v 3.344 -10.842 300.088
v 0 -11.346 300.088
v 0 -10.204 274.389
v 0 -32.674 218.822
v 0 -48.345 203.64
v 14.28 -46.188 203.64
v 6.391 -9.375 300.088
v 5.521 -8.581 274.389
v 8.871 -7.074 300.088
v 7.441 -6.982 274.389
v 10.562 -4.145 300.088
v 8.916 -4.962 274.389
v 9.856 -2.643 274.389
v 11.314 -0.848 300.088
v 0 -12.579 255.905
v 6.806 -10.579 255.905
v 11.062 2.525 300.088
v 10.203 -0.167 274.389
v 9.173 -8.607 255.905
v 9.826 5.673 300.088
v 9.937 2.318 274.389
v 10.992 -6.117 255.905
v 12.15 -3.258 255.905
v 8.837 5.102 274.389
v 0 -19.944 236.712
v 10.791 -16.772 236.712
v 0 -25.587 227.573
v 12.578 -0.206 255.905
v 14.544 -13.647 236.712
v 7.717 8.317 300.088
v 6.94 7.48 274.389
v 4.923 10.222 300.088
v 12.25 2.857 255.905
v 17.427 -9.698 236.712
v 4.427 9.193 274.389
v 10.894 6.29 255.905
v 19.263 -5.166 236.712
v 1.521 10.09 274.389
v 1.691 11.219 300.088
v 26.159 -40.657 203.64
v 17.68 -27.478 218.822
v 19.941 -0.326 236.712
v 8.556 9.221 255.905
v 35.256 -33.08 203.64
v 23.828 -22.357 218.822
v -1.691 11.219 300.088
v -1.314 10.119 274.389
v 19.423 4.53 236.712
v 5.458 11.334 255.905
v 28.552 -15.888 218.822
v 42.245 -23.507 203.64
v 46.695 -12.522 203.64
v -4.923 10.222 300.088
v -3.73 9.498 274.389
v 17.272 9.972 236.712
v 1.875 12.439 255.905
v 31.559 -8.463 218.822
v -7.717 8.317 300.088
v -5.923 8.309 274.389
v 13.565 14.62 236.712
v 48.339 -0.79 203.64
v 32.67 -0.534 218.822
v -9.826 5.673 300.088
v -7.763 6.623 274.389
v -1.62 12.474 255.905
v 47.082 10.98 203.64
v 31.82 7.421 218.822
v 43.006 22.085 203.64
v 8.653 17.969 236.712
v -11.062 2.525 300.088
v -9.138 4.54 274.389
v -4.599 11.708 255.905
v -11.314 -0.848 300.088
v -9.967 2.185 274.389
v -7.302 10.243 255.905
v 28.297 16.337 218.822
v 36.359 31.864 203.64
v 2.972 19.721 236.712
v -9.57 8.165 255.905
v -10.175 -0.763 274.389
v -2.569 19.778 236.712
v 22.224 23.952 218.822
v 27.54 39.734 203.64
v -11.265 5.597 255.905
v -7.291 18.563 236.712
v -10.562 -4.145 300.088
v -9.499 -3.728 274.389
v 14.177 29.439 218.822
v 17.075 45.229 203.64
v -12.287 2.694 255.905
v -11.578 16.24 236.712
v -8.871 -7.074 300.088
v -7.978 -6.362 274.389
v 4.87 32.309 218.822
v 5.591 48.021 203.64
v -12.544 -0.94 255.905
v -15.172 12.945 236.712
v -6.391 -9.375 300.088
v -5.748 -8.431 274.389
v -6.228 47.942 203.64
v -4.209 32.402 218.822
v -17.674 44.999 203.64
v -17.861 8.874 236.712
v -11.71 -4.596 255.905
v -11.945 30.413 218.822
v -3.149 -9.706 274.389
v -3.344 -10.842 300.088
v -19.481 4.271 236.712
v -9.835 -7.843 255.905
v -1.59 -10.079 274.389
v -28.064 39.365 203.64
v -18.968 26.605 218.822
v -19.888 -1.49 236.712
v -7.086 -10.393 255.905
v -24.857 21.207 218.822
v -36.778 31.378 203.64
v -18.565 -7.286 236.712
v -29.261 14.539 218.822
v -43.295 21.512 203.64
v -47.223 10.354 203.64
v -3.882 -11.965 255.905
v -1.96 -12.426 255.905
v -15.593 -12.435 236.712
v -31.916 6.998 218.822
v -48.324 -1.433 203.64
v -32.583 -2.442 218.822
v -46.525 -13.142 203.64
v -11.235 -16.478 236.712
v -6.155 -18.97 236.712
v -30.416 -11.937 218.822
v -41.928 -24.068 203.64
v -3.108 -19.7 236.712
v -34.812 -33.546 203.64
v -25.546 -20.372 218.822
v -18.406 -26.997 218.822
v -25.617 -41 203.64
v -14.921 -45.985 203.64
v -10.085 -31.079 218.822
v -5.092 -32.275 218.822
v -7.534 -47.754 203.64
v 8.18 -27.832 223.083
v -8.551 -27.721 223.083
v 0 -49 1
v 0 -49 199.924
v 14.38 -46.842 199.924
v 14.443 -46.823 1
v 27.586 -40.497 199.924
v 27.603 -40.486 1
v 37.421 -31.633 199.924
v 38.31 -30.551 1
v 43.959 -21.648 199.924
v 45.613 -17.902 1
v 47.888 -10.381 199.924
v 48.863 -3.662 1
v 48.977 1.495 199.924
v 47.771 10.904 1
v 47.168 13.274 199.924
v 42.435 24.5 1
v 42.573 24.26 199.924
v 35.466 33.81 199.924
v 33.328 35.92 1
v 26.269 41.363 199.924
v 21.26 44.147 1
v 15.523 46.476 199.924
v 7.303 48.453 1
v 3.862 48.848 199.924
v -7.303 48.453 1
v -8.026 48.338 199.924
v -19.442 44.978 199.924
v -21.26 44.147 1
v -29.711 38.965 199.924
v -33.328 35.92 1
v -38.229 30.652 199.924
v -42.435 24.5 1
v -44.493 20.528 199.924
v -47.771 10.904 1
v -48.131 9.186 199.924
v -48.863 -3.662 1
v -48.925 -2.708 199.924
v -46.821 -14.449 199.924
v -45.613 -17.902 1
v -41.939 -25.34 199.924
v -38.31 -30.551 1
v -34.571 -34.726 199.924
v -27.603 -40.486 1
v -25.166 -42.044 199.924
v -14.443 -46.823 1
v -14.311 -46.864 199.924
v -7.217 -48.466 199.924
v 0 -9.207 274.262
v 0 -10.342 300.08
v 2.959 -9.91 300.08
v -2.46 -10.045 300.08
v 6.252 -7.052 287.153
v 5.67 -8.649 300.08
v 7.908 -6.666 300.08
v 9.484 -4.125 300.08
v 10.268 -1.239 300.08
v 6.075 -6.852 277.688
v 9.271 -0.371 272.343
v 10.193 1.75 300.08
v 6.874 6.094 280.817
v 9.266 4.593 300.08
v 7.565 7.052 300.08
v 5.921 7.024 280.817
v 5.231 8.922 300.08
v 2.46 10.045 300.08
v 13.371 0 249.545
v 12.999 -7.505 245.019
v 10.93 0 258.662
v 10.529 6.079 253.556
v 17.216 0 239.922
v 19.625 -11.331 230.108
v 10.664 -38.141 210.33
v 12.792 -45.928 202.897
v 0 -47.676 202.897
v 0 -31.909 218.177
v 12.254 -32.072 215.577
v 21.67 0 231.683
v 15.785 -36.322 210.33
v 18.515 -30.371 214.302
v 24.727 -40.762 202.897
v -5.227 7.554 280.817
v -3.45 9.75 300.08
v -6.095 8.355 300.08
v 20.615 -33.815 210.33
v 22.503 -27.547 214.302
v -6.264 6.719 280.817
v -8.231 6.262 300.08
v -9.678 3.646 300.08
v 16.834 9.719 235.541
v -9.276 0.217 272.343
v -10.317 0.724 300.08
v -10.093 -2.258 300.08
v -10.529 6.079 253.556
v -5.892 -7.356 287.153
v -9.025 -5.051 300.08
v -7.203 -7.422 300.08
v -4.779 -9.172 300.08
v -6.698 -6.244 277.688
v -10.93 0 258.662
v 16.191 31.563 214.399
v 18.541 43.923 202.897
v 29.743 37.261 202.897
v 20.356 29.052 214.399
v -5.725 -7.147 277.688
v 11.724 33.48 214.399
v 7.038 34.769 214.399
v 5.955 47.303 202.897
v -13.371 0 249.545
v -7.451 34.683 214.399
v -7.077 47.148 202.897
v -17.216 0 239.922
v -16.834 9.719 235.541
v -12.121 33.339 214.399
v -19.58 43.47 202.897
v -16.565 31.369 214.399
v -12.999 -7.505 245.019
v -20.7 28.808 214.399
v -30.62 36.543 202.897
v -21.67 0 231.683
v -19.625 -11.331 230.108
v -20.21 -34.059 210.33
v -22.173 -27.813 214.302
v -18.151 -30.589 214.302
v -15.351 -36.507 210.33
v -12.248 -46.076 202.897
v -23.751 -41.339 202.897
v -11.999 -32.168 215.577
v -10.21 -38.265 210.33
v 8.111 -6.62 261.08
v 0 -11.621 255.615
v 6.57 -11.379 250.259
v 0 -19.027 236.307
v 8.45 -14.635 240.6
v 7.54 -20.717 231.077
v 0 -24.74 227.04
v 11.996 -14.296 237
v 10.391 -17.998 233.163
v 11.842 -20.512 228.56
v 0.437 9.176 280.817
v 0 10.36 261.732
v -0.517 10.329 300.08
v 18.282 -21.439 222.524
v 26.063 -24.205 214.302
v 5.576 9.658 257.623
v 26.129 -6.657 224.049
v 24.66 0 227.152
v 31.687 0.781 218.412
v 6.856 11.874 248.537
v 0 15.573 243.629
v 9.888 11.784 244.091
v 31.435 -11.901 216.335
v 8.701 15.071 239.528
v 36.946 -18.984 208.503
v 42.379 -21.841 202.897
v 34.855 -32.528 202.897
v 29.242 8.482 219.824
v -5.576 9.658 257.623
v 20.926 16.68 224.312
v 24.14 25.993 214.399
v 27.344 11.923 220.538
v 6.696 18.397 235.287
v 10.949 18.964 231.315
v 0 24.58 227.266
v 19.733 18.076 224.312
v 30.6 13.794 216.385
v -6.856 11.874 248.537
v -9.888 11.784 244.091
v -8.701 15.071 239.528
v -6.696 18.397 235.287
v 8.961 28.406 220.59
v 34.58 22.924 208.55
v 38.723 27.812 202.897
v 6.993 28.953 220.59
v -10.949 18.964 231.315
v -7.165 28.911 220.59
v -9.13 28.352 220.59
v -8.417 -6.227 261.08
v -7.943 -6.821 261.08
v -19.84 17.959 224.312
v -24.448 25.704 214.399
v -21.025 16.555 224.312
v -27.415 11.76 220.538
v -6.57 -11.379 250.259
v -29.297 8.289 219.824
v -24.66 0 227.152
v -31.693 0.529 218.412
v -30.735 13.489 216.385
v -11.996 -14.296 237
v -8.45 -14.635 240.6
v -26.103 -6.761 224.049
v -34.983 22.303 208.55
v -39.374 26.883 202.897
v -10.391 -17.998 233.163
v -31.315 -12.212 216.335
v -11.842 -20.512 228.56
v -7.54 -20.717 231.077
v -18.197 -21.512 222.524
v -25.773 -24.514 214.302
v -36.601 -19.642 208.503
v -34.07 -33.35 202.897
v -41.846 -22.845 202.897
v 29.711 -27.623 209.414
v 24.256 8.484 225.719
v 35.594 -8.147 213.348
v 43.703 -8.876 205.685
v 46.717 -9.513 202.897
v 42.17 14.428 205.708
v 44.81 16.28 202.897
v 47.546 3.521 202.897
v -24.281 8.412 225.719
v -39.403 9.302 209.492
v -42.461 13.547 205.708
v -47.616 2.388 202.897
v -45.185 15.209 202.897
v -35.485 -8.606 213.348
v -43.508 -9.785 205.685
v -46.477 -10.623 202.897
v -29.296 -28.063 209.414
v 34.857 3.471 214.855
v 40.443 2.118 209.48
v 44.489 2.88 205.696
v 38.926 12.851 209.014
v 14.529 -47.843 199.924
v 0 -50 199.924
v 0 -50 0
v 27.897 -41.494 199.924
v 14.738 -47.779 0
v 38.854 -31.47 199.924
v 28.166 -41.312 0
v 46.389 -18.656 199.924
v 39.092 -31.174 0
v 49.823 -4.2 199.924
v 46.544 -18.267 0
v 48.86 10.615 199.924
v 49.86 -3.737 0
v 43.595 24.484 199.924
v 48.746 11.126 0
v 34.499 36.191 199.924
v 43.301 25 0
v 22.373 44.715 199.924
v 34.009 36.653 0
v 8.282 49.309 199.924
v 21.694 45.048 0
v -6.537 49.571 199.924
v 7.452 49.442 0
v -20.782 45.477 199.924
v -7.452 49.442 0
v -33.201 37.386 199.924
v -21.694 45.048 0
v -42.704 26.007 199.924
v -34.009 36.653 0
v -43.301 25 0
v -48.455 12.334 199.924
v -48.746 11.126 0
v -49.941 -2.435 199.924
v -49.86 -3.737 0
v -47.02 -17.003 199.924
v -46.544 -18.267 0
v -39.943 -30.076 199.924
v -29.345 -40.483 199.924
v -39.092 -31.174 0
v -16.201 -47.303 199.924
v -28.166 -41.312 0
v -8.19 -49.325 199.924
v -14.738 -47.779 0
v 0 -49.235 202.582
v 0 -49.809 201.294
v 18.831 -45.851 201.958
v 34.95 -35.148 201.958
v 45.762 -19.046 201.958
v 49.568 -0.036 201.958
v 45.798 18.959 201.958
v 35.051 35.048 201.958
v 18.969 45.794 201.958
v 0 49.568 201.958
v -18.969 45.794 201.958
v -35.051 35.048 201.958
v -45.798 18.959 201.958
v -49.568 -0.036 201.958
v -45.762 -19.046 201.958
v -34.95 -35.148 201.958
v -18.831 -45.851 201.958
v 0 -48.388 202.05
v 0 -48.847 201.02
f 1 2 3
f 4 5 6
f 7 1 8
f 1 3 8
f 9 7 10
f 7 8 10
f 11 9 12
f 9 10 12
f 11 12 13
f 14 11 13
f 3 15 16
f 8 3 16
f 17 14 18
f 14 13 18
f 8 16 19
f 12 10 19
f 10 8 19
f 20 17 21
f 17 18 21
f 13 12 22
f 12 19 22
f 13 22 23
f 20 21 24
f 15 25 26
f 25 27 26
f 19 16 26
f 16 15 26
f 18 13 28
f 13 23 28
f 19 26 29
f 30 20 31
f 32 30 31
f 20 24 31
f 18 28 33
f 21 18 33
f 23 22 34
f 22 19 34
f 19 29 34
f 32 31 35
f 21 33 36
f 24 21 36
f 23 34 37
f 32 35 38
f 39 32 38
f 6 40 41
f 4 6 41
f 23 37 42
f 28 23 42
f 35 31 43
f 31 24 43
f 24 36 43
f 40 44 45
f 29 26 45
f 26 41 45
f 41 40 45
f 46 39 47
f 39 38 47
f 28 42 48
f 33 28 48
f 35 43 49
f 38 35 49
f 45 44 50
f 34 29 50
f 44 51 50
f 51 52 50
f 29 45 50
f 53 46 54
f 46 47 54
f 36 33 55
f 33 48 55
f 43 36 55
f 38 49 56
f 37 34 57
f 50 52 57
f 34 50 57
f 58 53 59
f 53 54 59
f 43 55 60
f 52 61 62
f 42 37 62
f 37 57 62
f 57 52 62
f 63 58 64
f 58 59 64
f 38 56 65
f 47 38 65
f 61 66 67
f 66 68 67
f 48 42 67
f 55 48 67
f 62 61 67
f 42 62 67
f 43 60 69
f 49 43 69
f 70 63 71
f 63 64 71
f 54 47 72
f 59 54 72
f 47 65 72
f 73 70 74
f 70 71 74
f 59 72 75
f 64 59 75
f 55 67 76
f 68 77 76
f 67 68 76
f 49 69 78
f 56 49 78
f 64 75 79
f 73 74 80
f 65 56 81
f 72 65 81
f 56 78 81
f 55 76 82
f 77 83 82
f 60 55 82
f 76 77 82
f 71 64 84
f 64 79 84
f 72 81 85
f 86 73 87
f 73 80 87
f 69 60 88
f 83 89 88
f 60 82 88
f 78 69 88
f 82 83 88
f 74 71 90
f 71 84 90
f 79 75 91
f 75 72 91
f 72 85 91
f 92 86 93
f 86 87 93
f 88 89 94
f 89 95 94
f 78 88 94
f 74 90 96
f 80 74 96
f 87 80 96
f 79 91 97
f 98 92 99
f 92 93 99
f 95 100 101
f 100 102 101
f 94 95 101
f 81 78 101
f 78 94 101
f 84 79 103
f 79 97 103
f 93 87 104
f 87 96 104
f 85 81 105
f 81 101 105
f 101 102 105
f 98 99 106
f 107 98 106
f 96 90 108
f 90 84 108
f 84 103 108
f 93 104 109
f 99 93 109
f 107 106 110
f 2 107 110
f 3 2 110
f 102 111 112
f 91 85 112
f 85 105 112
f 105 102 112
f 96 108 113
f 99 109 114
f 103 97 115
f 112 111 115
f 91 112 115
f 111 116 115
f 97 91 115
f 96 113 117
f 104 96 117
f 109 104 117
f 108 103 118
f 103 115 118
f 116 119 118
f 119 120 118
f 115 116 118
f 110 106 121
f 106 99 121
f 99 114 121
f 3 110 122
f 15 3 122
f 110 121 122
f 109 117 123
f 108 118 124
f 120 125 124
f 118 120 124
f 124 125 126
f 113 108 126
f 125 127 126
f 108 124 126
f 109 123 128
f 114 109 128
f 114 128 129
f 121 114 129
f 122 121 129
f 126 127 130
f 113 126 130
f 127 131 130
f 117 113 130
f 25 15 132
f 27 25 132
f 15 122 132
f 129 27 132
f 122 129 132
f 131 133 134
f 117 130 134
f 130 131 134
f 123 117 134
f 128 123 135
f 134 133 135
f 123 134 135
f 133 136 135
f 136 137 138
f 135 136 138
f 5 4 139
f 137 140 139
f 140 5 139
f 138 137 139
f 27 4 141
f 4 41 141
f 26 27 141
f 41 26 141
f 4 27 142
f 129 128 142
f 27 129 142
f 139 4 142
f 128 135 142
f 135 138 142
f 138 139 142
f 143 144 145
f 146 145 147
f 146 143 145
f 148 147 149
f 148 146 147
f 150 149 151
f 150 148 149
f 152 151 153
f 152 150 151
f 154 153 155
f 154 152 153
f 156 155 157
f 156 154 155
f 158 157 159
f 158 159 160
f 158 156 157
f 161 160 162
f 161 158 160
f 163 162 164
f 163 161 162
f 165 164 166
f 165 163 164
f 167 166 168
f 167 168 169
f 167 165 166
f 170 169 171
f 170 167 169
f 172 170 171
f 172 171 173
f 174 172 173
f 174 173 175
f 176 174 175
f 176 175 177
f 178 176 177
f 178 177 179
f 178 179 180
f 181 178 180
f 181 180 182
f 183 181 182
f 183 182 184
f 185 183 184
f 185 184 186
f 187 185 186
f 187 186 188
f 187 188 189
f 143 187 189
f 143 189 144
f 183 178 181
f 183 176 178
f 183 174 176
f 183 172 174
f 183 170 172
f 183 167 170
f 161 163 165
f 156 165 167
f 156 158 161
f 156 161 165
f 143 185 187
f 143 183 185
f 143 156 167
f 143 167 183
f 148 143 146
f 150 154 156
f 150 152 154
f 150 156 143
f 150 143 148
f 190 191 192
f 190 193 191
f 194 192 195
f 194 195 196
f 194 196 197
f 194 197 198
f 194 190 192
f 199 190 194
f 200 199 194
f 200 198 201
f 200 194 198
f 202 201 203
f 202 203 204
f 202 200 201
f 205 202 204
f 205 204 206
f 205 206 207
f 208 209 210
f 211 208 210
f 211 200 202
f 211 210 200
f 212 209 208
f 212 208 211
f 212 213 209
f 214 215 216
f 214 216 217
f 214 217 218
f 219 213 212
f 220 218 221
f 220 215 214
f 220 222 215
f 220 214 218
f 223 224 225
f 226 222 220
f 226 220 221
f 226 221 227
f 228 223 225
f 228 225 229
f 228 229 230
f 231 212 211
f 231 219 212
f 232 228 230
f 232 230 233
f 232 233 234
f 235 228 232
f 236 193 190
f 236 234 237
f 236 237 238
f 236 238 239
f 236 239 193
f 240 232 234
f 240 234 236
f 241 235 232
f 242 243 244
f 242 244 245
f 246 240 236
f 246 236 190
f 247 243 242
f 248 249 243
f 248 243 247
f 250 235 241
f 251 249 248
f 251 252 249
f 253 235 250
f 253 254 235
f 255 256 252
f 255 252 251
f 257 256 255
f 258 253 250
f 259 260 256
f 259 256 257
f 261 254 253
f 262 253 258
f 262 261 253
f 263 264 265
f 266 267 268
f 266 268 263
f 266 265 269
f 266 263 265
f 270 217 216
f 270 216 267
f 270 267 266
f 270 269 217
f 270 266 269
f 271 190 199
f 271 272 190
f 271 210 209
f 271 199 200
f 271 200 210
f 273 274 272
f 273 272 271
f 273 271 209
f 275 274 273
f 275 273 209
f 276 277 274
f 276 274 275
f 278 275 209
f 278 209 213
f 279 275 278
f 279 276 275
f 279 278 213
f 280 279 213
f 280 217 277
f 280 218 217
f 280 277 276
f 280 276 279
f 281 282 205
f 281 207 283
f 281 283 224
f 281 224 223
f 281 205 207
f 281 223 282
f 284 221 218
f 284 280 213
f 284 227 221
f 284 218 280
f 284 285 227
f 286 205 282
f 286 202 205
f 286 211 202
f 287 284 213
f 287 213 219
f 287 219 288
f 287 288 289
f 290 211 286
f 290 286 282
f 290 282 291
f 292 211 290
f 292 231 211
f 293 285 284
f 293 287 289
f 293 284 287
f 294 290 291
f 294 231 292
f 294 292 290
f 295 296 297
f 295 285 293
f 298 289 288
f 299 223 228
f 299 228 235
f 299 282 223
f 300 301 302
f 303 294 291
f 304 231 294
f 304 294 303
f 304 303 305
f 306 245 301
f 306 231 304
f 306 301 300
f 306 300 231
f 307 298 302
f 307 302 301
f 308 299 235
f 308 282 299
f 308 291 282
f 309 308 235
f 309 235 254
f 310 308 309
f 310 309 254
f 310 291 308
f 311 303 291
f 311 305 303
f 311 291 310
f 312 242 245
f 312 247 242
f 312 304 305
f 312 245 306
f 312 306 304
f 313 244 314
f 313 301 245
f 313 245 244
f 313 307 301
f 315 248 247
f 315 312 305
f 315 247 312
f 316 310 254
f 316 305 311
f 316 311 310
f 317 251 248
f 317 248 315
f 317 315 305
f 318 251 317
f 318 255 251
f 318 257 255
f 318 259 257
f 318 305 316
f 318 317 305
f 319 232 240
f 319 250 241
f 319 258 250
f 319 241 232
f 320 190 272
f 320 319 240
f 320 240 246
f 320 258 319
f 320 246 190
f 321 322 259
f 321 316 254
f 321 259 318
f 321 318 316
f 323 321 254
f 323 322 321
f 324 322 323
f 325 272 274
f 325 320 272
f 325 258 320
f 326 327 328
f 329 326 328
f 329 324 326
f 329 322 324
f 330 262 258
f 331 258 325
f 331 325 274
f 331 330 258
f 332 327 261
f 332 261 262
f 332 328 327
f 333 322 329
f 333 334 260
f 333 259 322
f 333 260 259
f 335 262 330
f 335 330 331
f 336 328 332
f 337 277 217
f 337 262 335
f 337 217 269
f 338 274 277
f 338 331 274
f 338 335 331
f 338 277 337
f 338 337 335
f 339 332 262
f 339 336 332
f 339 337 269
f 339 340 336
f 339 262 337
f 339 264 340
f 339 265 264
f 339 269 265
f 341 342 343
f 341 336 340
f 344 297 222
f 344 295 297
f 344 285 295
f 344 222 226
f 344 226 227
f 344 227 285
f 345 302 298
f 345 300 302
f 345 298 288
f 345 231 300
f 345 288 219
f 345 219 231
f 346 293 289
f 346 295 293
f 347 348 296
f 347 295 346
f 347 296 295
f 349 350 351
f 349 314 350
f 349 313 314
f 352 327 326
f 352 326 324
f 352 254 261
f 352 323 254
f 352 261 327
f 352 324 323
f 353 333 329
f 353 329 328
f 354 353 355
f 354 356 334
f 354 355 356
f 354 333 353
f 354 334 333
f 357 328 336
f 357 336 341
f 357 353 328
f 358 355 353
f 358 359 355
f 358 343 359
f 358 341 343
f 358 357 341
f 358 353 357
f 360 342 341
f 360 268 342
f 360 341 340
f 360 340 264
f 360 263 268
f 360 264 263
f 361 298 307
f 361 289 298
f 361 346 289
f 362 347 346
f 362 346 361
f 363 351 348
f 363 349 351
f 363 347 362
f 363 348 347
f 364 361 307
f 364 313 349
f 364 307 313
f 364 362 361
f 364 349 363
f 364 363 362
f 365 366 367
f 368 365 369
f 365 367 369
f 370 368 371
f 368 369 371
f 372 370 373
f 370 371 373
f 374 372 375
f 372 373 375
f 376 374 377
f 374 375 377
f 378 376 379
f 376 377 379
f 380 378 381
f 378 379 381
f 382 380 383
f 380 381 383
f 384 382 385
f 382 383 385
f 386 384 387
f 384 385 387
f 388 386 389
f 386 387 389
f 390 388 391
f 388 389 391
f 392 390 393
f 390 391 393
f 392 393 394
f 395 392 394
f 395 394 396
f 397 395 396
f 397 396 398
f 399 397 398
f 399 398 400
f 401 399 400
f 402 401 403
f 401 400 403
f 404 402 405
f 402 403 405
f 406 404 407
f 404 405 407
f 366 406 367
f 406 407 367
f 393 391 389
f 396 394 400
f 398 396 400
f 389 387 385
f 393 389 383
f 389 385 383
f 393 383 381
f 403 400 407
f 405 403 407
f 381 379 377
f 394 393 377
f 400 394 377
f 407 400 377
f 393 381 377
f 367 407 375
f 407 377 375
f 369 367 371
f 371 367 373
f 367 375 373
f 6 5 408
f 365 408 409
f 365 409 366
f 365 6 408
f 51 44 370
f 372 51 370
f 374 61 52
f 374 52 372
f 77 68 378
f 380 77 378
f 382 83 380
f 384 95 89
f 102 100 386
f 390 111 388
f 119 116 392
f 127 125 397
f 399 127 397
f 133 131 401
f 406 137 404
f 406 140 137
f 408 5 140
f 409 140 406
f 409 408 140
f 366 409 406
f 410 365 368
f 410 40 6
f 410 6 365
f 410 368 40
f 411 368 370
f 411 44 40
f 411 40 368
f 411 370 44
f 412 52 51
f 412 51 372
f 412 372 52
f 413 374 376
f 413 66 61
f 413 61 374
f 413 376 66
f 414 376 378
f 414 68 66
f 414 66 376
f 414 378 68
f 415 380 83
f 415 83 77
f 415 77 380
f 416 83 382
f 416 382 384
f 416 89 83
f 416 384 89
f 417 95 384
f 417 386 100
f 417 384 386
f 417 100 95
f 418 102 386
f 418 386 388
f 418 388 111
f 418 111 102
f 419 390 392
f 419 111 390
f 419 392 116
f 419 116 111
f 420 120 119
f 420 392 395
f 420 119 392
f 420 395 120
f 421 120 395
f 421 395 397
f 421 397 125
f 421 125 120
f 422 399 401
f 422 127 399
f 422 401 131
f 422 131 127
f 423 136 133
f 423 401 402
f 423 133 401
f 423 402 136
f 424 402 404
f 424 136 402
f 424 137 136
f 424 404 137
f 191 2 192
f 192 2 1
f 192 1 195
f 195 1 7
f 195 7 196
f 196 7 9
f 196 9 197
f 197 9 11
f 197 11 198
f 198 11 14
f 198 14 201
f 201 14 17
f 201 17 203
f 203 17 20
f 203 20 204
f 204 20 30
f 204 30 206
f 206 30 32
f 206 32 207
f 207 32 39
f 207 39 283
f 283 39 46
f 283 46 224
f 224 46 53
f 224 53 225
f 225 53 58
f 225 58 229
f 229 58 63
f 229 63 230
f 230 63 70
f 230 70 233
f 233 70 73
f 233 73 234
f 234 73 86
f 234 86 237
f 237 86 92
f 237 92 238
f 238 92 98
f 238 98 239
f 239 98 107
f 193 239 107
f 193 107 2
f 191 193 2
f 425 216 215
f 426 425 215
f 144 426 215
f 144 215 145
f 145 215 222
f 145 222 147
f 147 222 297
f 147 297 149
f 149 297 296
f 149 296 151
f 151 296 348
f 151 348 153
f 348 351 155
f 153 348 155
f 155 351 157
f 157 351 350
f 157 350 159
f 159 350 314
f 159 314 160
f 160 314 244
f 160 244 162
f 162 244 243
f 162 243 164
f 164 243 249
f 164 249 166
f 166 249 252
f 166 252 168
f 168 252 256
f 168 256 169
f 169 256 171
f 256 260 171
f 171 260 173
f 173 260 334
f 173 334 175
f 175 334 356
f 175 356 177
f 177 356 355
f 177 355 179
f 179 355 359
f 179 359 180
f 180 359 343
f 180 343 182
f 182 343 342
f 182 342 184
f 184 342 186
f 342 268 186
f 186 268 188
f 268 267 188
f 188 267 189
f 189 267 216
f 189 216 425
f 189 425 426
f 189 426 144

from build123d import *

# Parameters (mm, degrees)
F2_R = 5
F3_T = -1


with BuildPart() as f1:
    # F0 (on Right) → F1 (revolve)
    with BuildSketch(Plane.YZ):
        with BuildLine():
            Line((-50, 0), (0, 0))
            Line((0, 0), (0, 300))
            Line((0, 300), (-11.3461146221, 300.0875539066))
            add(Edge.make_bspline(
                [(-11.3461146221, 300.0875539066), (-10.3159753105, 287.2231359493), (-8.274136168, 261.7245729538), (-23.2910328816, 226.1502237174), (-41.1491029613, 210.1048511491), (-50, 202.1523714066)],
                knots=[0, 0, 0, 0, 0.3393096599, 0.6725456811, 1, 1, 1, 1], degree=3))
            Line((-50, 202.1523714066), (-50, 0))
        make_face()
    revolve(axis=Axis((0, 0, 150), (0, 0, 1)))

    # F2
    f2_edges = [f1.edges().sort_by_distance(p)[0] for p in [
        (0, 50, 202.152371),
    ]]
    fillet(f2_edges, radius=F2_R)

    # F3
    f3_openings = [f1.faces().sort_by_distance(p)[0] for p in [
        (0, 5.673057, 300.043777),
    ]]
    offset(amount=F3_T, openings=f3_openings)


solid = f1.part
